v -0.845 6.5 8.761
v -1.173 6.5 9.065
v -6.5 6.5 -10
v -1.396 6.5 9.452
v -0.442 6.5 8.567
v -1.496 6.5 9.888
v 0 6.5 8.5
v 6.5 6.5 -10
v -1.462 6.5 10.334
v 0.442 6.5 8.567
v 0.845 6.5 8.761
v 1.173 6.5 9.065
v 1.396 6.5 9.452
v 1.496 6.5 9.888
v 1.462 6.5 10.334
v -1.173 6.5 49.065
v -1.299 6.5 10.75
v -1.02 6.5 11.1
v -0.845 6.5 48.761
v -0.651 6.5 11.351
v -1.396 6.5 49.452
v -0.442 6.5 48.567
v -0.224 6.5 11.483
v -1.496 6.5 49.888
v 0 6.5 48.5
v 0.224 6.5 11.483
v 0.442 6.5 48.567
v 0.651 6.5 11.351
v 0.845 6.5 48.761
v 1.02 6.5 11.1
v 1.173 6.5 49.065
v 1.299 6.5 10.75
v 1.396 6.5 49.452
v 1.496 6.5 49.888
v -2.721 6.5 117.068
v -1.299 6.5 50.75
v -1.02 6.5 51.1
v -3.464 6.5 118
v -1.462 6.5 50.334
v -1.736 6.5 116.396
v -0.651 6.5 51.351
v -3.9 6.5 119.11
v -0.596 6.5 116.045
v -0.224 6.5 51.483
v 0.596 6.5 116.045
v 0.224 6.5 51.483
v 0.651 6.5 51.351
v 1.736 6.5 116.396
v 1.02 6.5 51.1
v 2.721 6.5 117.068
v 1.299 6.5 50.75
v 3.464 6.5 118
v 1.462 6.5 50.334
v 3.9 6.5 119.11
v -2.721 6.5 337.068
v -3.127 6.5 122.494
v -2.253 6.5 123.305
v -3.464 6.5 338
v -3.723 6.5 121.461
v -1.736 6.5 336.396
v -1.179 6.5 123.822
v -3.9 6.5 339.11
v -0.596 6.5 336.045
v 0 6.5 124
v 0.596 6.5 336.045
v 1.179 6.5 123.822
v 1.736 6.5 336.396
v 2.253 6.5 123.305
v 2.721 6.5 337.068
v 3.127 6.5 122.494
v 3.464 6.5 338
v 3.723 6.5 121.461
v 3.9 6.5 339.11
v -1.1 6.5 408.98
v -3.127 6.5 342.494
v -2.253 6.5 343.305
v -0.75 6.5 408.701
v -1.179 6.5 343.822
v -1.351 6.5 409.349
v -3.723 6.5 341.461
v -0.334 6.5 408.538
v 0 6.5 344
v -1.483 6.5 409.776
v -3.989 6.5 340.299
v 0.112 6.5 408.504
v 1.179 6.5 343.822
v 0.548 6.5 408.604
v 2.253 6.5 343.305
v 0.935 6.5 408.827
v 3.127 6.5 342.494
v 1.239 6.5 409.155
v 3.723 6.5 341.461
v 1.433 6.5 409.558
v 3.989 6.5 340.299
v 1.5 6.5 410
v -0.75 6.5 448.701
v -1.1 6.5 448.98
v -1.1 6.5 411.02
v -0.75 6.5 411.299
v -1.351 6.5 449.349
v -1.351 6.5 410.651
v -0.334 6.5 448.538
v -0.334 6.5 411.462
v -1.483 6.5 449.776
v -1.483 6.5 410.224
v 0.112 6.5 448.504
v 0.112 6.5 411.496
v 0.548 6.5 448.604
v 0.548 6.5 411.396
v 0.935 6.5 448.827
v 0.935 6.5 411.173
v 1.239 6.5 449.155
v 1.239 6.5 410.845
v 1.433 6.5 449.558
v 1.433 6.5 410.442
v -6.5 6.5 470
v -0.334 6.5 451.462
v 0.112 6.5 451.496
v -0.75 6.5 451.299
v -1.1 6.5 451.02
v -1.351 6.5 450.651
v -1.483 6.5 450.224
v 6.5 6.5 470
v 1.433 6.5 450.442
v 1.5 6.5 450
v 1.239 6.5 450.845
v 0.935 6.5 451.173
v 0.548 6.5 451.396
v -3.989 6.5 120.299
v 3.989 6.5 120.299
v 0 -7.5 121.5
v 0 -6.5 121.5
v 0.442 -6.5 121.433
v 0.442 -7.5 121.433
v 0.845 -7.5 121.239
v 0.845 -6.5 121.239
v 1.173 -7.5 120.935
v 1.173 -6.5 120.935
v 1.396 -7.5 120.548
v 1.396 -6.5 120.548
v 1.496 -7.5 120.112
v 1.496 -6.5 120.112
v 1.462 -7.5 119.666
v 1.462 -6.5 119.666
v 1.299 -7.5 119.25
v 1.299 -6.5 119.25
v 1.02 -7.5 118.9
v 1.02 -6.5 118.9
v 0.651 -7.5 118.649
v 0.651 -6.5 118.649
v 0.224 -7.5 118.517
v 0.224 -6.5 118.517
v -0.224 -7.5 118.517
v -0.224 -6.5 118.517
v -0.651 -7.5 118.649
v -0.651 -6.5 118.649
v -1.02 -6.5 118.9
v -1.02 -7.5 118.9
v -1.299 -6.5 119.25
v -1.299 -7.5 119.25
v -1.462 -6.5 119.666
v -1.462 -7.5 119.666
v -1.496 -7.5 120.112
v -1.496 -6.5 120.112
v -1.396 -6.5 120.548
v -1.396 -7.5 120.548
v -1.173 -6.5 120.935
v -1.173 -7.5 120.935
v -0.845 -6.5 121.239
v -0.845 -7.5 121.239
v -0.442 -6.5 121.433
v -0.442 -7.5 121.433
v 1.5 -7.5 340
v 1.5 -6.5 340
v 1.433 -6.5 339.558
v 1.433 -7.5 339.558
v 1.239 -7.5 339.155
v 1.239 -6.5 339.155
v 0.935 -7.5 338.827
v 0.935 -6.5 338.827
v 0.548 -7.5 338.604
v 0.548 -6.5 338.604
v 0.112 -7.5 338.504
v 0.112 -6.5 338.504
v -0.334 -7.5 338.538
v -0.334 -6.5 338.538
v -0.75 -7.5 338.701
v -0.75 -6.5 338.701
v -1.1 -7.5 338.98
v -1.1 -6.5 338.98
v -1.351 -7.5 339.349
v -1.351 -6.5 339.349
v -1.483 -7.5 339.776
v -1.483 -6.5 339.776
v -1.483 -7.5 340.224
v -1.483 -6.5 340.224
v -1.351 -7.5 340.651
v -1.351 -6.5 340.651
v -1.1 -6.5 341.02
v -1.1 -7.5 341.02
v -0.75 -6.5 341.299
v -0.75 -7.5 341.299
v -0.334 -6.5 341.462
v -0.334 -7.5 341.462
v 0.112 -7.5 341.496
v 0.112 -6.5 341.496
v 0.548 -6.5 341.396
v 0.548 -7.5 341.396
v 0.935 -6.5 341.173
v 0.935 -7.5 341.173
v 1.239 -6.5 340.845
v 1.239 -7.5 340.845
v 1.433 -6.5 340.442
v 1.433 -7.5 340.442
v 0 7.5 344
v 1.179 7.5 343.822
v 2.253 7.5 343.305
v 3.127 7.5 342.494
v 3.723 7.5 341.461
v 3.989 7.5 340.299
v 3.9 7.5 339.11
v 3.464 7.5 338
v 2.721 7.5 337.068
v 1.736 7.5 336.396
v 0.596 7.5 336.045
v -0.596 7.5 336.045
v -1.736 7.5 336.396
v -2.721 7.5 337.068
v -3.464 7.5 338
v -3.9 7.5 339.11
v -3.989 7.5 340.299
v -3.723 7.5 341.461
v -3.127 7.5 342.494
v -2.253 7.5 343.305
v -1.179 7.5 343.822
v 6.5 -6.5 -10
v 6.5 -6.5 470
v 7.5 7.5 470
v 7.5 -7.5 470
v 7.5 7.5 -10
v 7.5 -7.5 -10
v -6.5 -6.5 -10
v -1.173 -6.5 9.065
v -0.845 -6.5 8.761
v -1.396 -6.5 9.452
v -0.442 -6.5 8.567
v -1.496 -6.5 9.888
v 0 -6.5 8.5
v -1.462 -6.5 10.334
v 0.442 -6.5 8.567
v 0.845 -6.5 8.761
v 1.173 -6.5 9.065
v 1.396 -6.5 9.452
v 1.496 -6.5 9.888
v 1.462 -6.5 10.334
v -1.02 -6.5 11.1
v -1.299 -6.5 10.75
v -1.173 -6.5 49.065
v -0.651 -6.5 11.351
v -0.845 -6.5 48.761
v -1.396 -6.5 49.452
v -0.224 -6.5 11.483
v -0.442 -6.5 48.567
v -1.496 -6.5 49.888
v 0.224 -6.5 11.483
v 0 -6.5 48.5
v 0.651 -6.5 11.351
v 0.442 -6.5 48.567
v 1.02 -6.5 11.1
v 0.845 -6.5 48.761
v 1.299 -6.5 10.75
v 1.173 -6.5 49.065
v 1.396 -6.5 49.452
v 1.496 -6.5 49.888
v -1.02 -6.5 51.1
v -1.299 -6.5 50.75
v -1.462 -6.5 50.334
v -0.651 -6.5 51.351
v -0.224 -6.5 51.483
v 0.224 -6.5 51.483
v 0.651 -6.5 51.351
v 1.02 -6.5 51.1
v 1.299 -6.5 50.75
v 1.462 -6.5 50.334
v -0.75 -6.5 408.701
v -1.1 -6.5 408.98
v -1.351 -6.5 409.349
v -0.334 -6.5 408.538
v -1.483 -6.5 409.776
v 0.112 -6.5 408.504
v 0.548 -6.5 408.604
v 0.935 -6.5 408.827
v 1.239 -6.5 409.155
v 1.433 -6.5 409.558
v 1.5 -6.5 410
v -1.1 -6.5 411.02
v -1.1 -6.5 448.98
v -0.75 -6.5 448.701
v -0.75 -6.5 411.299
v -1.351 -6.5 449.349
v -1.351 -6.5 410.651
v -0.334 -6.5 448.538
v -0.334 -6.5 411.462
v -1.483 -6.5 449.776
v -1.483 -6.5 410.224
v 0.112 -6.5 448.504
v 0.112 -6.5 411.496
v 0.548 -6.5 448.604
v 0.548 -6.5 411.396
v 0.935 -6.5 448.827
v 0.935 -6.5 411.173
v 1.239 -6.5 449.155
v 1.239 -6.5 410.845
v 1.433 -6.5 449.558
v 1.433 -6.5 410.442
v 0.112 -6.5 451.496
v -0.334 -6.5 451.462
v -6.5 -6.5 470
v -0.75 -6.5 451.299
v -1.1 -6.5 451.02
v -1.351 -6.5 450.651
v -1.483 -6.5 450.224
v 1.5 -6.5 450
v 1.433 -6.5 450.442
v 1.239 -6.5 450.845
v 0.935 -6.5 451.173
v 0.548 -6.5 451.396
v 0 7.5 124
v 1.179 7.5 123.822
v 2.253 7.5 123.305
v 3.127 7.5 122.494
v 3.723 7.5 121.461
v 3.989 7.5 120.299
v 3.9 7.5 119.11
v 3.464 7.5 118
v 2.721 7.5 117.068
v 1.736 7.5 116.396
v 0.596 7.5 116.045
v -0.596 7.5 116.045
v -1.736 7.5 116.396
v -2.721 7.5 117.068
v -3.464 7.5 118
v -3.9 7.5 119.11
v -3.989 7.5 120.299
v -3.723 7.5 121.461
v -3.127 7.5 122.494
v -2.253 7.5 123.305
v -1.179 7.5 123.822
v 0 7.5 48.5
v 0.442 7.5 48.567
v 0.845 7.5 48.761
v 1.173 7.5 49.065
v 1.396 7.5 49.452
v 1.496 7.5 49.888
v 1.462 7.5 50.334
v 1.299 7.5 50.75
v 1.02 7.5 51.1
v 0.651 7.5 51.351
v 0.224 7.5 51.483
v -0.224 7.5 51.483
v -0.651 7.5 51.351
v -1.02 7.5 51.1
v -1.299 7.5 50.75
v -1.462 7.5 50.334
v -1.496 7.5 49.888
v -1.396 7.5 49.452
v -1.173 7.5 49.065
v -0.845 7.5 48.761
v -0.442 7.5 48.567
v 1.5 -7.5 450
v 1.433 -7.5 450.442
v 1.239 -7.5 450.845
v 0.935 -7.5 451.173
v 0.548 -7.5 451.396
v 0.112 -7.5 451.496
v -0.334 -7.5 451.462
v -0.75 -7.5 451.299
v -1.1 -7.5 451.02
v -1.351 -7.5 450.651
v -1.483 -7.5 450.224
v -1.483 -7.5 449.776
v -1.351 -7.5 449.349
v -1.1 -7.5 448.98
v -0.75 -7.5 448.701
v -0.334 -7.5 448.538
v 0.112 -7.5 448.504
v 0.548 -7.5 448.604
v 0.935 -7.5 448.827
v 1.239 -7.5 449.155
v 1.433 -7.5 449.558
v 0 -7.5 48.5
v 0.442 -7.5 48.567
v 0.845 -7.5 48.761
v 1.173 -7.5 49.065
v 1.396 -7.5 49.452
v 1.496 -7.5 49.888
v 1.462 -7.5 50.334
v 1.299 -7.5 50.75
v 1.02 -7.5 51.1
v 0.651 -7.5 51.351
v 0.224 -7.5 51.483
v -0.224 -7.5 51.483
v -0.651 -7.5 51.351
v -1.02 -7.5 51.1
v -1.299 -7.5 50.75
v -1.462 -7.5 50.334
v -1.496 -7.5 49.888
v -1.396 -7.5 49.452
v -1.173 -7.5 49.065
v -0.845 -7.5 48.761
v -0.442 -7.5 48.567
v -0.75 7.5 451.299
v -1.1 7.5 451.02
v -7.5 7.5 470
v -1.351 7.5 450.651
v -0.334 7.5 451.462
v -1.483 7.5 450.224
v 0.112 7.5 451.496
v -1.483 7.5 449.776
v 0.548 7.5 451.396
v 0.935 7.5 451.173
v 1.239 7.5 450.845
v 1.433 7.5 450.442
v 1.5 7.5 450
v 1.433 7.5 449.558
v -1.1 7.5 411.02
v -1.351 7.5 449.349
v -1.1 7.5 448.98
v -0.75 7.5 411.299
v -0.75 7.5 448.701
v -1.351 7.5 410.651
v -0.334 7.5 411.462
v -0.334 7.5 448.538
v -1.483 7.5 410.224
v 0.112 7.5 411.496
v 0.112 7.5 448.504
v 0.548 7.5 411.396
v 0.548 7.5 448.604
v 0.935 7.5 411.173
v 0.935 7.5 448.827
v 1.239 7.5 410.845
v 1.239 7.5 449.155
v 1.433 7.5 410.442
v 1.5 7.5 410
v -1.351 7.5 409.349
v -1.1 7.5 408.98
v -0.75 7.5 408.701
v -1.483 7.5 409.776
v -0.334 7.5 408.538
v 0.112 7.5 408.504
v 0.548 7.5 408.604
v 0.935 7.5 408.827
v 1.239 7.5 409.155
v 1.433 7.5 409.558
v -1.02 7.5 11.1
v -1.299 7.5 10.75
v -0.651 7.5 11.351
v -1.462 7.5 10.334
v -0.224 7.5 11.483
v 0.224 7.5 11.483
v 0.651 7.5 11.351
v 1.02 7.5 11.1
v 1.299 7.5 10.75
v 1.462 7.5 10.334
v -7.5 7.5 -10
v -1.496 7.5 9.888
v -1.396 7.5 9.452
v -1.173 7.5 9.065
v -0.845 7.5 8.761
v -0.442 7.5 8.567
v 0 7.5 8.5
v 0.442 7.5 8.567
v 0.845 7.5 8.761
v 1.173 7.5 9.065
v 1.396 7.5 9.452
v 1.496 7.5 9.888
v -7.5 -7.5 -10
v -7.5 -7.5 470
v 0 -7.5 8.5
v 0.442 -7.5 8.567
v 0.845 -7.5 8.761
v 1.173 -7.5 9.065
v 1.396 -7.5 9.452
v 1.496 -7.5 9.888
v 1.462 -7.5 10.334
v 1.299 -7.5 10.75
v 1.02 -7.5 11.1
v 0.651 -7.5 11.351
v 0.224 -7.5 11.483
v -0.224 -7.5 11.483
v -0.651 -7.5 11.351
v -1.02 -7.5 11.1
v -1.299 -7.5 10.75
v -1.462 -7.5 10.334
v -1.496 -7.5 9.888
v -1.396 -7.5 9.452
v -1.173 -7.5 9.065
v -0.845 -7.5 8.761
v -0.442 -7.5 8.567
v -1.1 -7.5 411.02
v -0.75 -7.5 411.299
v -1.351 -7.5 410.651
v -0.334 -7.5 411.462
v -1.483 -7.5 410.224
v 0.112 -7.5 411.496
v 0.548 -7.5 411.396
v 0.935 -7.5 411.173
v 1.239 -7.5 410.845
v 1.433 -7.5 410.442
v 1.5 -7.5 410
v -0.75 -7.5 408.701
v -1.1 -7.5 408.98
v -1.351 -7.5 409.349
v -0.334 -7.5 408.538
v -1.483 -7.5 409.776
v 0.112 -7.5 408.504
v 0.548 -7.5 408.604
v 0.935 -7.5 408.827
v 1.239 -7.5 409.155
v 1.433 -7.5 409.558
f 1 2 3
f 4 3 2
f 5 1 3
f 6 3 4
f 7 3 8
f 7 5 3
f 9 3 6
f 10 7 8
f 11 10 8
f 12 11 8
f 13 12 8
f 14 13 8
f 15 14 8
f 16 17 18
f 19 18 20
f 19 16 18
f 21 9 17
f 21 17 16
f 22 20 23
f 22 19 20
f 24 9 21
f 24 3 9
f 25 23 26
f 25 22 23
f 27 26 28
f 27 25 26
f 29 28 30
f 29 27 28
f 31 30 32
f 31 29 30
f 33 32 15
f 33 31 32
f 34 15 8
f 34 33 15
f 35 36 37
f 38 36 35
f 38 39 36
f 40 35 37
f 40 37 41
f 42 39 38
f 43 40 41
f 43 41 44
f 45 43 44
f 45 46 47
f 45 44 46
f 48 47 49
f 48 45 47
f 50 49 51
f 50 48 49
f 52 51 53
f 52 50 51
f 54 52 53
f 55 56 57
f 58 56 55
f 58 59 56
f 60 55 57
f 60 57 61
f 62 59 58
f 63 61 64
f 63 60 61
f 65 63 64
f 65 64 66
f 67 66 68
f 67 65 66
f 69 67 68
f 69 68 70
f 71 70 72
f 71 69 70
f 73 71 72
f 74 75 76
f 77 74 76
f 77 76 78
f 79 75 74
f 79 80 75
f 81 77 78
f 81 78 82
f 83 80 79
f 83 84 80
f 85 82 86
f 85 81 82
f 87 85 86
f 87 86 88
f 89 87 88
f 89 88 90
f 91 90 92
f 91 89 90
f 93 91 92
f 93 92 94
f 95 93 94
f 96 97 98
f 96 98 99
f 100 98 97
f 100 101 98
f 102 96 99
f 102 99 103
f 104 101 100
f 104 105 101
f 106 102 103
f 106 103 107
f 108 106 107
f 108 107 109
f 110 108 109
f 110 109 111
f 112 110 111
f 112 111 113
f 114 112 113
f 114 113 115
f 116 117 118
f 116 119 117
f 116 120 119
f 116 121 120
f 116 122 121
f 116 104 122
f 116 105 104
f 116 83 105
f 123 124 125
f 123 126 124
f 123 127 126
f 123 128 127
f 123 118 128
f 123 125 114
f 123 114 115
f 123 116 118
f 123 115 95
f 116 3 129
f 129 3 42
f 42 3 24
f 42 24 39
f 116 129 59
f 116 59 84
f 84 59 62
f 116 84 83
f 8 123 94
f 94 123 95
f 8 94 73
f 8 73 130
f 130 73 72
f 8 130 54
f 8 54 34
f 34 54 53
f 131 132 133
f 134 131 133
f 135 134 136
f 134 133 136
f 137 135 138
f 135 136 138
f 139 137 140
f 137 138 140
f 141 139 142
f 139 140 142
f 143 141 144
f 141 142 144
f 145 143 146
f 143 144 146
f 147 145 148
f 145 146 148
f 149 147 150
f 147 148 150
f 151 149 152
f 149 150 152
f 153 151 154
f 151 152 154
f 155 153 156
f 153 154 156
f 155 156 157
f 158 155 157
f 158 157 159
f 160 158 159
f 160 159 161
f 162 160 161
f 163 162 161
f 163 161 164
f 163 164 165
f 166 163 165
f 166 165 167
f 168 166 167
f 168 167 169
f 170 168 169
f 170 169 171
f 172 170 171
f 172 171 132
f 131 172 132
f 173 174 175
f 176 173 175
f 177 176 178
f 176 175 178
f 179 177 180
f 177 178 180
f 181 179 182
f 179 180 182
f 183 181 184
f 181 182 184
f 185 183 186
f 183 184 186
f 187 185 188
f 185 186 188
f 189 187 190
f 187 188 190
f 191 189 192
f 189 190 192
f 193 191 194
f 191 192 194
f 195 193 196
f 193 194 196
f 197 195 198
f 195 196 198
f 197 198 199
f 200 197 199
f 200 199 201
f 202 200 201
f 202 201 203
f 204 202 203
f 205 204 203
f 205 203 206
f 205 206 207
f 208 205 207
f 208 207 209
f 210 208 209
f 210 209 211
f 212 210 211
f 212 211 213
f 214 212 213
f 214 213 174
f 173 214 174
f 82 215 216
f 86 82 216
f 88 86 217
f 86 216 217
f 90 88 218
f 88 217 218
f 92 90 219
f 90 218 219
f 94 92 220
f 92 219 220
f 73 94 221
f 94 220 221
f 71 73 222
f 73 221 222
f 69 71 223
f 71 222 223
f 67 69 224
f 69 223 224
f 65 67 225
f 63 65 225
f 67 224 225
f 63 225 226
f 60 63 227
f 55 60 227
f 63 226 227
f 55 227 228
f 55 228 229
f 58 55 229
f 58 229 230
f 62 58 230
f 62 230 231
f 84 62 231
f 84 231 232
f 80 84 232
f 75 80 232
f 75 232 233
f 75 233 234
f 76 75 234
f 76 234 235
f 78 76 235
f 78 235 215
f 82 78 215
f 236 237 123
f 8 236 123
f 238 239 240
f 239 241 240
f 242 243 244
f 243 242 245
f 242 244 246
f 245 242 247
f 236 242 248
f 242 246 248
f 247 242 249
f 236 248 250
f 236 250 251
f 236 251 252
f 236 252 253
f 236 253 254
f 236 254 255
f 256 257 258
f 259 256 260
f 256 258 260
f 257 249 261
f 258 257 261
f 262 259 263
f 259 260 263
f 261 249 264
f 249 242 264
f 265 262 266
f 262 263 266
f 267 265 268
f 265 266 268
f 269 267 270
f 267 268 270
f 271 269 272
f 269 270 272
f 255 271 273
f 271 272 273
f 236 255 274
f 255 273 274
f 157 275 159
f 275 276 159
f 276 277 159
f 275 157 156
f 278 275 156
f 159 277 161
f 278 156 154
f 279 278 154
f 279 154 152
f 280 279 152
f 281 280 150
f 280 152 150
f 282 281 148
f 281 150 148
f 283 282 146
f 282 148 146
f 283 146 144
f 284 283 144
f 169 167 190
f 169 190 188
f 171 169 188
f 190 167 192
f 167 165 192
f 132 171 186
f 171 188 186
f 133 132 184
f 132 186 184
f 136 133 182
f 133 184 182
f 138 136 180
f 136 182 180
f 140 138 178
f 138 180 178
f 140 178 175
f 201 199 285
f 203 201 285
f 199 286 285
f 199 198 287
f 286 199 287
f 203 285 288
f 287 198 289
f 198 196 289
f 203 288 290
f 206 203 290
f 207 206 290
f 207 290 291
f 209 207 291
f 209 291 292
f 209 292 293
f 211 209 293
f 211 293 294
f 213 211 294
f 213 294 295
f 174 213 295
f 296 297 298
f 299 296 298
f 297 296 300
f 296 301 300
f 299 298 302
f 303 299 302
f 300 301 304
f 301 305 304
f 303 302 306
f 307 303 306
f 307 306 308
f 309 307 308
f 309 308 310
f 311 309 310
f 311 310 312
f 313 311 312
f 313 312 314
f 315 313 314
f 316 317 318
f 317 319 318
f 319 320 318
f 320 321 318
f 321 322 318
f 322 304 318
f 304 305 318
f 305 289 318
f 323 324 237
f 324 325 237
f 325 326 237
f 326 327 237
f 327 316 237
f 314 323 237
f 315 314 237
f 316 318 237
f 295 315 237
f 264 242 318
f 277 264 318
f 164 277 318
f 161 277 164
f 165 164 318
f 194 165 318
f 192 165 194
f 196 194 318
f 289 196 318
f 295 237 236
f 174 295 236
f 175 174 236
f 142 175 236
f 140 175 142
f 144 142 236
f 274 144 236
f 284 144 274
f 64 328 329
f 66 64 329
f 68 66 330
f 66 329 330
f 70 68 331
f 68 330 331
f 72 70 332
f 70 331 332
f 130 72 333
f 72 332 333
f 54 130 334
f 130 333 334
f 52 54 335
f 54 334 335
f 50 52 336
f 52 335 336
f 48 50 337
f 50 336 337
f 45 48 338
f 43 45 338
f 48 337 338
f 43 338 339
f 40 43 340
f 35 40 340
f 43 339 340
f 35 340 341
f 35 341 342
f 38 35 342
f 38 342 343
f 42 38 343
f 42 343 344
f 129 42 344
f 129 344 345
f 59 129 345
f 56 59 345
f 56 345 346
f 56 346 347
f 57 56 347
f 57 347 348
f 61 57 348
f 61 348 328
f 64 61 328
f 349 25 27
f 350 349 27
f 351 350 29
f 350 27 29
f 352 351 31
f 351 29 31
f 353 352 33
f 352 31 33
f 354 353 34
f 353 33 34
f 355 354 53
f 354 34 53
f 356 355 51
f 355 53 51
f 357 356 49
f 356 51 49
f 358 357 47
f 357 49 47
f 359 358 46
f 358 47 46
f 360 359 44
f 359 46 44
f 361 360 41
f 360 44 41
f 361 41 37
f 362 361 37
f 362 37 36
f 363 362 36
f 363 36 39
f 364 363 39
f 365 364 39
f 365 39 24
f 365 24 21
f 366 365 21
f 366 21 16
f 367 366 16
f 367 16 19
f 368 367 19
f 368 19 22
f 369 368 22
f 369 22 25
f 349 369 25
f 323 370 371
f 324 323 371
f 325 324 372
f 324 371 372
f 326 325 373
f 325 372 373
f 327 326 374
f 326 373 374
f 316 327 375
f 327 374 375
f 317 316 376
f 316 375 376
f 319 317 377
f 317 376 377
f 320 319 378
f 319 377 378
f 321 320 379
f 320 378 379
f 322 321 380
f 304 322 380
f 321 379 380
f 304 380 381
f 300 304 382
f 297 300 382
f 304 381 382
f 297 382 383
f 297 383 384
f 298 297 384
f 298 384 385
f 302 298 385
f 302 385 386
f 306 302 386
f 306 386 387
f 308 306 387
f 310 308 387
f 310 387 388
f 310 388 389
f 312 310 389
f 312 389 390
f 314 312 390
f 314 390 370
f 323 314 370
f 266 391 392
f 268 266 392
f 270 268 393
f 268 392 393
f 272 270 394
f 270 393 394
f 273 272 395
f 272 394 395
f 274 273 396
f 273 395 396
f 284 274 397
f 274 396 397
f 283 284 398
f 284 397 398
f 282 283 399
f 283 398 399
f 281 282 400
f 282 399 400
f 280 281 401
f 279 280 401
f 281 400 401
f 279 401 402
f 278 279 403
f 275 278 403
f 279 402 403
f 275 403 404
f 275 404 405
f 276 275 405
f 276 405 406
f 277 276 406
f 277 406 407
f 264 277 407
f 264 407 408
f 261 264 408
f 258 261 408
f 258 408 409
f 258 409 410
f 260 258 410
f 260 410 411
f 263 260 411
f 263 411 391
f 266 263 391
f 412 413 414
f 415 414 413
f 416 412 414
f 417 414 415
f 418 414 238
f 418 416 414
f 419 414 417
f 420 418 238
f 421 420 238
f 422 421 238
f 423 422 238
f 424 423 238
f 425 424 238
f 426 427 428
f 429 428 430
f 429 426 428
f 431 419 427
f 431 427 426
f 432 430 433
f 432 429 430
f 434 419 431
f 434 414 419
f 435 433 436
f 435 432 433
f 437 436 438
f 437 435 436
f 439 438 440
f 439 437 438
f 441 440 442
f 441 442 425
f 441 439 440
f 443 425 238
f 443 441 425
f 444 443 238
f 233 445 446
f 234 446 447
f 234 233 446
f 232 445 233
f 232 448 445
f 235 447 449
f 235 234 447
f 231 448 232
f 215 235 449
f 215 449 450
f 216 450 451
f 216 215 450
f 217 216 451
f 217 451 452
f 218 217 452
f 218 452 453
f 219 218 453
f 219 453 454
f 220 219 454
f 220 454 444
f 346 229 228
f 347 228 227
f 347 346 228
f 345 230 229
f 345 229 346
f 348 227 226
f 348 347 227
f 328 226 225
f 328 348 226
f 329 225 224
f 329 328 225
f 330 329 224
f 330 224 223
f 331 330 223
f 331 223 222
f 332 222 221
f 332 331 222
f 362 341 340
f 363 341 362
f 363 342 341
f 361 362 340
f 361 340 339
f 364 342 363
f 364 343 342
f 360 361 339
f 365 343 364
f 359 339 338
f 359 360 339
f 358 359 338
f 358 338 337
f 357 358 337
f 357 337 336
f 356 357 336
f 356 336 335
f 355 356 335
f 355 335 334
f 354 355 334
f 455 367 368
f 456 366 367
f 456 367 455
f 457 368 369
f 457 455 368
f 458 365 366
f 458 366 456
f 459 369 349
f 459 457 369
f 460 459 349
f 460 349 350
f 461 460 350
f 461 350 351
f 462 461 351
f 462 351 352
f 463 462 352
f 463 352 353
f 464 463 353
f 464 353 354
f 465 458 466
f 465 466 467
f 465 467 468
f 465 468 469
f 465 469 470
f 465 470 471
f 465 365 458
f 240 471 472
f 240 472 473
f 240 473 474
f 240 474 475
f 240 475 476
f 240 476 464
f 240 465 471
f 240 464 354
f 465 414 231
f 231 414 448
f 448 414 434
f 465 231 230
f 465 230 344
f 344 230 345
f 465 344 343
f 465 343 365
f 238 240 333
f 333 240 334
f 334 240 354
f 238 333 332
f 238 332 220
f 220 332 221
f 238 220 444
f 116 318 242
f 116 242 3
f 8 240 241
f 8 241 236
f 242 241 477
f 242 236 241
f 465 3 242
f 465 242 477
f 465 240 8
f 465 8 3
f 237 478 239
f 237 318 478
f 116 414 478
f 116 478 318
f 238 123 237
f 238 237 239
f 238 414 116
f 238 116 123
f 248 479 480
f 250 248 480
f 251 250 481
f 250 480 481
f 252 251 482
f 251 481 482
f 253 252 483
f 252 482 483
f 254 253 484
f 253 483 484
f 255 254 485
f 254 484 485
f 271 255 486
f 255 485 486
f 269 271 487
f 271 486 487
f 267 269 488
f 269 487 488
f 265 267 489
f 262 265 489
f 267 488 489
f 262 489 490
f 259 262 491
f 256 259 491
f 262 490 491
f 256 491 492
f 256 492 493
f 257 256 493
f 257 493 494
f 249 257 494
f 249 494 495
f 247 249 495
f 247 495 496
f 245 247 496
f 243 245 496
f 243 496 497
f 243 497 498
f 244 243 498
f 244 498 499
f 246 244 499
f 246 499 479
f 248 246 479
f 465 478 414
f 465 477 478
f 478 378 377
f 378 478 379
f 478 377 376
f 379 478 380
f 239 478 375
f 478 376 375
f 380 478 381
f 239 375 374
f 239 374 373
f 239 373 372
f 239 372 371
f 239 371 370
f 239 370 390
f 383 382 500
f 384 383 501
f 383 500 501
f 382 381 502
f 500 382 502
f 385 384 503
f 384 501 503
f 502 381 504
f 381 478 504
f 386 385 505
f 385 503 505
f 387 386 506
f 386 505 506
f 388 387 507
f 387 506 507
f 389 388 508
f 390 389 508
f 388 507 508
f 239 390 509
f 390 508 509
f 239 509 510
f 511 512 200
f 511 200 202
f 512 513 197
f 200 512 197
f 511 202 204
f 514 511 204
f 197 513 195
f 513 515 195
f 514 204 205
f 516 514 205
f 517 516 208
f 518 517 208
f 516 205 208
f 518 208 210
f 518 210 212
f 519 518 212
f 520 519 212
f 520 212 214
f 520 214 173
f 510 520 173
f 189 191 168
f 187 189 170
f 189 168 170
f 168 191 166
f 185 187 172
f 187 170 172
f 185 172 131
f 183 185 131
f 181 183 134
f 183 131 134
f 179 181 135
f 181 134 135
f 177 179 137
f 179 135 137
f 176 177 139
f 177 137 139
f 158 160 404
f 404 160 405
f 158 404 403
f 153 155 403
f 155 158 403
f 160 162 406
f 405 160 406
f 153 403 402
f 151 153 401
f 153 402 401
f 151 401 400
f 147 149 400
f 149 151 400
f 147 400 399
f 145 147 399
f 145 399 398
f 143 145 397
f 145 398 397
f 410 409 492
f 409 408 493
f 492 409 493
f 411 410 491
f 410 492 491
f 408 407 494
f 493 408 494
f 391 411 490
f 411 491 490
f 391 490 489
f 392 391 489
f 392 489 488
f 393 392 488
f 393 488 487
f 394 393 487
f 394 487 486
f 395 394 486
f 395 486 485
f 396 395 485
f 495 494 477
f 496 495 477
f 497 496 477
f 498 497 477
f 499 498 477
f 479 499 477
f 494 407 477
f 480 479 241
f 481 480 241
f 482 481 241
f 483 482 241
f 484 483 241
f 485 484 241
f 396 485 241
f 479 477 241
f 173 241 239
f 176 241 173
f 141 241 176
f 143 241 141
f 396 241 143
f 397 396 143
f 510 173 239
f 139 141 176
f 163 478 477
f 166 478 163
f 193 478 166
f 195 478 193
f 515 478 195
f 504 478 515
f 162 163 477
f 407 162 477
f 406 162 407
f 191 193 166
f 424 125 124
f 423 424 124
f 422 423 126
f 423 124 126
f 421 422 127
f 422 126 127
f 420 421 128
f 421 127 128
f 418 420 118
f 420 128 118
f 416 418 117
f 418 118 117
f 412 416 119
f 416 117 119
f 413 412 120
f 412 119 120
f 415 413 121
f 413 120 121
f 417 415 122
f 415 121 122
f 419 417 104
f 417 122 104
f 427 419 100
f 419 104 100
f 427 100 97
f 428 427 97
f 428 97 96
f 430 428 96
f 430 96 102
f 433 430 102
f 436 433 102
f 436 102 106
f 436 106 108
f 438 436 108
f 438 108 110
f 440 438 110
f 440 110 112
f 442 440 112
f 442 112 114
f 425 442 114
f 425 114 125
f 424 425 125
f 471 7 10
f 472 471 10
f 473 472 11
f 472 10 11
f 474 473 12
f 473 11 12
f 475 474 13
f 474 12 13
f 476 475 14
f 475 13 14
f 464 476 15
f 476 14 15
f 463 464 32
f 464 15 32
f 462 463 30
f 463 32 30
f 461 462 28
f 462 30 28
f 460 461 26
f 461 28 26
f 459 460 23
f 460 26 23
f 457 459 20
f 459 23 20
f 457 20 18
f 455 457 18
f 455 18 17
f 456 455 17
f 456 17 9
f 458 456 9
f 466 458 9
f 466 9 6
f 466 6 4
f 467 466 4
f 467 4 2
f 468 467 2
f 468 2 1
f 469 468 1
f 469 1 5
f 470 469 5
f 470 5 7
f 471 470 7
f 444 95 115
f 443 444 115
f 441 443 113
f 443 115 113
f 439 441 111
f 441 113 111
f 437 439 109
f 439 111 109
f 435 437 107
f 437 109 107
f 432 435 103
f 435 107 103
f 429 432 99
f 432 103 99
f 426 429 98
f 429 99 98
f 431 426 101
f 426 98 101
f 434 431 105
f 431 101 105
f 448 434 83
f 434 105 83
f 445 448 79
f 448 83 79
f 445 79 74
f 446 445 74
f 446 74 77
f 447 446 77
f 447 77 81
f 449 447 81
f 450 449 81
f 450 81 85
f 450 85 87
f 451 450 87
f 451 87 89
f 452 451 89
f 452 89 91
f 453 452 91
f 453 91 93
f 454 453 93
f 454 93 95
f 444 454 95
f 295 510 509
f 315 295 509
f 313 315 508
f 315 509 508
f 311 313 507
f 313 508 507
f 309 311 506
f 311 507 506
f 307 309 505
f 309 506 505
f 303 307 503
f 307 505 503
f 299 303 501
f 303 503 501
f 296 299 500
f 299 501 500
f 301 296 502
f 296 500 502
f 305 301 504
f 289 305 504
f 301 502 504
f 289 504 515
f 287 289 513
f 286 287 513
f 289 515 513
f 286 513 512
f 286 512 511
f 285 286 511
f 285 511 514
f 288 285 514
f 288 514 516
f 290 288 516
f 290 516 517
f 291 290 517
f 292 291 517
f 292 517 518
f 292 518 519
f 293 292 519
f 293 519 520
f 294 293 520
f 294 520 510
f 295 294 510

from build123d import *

# Parameters (mm, degrees)
SKETCH_1_W          = 15
SKETCH_1_H          = 15
SKETCH_1_W_2        = 13
SKETCH_1_H_2        = 13
EXTRUDE_1_DEPTH     = 460
SKETCH_2_R          = 1.5
CUT_EXTRUDE_1_DEPTH = 480
SKETCH_3_R          = 4
CUT_EXTRUDE_2_DEPTH = 2
SKETCH_4_W          = 15
SKETCH_4_H          = 15
EXTRUDE_2_DEPTH     = 10
SKETCH_5_W          = 15
SKETCH_5_H          = 15
EXTRUDE_3_DEPTH     = 10
SKETCH_6_W          = 13
SKETCH_6_H          = 13
CUT_EXTRUDE_3_DEPTH = 481.117173198
SKETCH_7_R          = 1.5
CUT_EXTRUDE_4_DEPTH = 471.299106952


with BuildPart() as part:
    # 草图1 → 凸台-拉伸1 (new body)
    with BuildSketch(Plane.XY):
        Rectangle(SKETCH_1_W, SKETCH_1_H)
        Rectangle(SKETCH_1_W_2, SKETCH_1_H_2, mode=Mode.SUBTRACT)
    extrude(amount=EXTRUDE_1_DEPTH)

    # 草图2 → 切除-拉伸1 (cut)
    with BuildSketch(Plane(origin=(0, 7.5, 0), x_dir=(1, 0, 0), z_dir=(0, 1, 0))):
        with Locations(Location((0, -120, 0), (0, 0, 270))):
            Circle(SKETCH_2_R)
        with Locations((0, -340)):
            Circle(SKETCH_2_R)
    extrude(amount=-CUT_EXTRUDE_1_DEPTH, mode=Mode.SUBTRACT)

    # 草图3 → 切除-拉伸2 (cut)
    with BuildSketch(Plane(origin=(0, 7.5, 0), x_dir=(1, 0, 0), z_dir=(0, 1, 0))):
        with Locations(Location((0, -120, 0), (0, 0, 270))):
            Circle(SKETCH_3_R)
        with Locations(Location((0, -340, 0), (0, 0, 270))):
            Circle(SKETCH_3_R)
    extrude(amount=-CUT_EXTRUDE_2_DEPTH, mode=Mode.SUBTRACT)

    # 草图4 → 凸台-拉伸2 (add)
    with BuildSketch(Plane(origin=(0, 0, 0), x_dir=(-1, 0, 0), z_dir=(0, 0, -1))):
        Rectangle(SKETCH_4_W, SKETCH_4_H)
    extrude(amount=EXTRUDE_2_DEPTH)

    # 草图5 → 凸台-拉伸3 (add)
    with BuildSketch(Plane.XY.offset(460)):
        Rectangle(SKETCH_5_W, SKETCH_5_H)
    extrude(amount=EXTRUDE_3_DEPTH)

    # 草图6 → 切除-拉伸3 (cut, through all)
    with BuildSketch(Plane.XY.offset(470)):
        Rectangle(SKETCH_6_W, SKETCH_6_H)
    extrude(amount=-CUT_EXTRUDE_3_DEPTH, mode=Mode.SUBTRACT)

    # 草图7 → 切除-拉伸4 (cut, through all)
    with BuildSketch(Plane.XZ.offset(7.5)):
        with Locations(Location((0, 10, 0), (0, 0, 270))):
            Circle(SKETCH_7_R)
        with Locations(Location((0, 50, 0), (0, 0, 270))):
            Circle(SKETCH_7_R)
        with Locations((0, 450)):
            Circle(SKETCH_7_R)
        with Locations((0, 410)):
            Circle(SKETCH_7_R)
    extrude(amount=-CUT_EXTRUDE_4_DEPTH, mode=Mode.SUBTRACT)


solid = part.part
